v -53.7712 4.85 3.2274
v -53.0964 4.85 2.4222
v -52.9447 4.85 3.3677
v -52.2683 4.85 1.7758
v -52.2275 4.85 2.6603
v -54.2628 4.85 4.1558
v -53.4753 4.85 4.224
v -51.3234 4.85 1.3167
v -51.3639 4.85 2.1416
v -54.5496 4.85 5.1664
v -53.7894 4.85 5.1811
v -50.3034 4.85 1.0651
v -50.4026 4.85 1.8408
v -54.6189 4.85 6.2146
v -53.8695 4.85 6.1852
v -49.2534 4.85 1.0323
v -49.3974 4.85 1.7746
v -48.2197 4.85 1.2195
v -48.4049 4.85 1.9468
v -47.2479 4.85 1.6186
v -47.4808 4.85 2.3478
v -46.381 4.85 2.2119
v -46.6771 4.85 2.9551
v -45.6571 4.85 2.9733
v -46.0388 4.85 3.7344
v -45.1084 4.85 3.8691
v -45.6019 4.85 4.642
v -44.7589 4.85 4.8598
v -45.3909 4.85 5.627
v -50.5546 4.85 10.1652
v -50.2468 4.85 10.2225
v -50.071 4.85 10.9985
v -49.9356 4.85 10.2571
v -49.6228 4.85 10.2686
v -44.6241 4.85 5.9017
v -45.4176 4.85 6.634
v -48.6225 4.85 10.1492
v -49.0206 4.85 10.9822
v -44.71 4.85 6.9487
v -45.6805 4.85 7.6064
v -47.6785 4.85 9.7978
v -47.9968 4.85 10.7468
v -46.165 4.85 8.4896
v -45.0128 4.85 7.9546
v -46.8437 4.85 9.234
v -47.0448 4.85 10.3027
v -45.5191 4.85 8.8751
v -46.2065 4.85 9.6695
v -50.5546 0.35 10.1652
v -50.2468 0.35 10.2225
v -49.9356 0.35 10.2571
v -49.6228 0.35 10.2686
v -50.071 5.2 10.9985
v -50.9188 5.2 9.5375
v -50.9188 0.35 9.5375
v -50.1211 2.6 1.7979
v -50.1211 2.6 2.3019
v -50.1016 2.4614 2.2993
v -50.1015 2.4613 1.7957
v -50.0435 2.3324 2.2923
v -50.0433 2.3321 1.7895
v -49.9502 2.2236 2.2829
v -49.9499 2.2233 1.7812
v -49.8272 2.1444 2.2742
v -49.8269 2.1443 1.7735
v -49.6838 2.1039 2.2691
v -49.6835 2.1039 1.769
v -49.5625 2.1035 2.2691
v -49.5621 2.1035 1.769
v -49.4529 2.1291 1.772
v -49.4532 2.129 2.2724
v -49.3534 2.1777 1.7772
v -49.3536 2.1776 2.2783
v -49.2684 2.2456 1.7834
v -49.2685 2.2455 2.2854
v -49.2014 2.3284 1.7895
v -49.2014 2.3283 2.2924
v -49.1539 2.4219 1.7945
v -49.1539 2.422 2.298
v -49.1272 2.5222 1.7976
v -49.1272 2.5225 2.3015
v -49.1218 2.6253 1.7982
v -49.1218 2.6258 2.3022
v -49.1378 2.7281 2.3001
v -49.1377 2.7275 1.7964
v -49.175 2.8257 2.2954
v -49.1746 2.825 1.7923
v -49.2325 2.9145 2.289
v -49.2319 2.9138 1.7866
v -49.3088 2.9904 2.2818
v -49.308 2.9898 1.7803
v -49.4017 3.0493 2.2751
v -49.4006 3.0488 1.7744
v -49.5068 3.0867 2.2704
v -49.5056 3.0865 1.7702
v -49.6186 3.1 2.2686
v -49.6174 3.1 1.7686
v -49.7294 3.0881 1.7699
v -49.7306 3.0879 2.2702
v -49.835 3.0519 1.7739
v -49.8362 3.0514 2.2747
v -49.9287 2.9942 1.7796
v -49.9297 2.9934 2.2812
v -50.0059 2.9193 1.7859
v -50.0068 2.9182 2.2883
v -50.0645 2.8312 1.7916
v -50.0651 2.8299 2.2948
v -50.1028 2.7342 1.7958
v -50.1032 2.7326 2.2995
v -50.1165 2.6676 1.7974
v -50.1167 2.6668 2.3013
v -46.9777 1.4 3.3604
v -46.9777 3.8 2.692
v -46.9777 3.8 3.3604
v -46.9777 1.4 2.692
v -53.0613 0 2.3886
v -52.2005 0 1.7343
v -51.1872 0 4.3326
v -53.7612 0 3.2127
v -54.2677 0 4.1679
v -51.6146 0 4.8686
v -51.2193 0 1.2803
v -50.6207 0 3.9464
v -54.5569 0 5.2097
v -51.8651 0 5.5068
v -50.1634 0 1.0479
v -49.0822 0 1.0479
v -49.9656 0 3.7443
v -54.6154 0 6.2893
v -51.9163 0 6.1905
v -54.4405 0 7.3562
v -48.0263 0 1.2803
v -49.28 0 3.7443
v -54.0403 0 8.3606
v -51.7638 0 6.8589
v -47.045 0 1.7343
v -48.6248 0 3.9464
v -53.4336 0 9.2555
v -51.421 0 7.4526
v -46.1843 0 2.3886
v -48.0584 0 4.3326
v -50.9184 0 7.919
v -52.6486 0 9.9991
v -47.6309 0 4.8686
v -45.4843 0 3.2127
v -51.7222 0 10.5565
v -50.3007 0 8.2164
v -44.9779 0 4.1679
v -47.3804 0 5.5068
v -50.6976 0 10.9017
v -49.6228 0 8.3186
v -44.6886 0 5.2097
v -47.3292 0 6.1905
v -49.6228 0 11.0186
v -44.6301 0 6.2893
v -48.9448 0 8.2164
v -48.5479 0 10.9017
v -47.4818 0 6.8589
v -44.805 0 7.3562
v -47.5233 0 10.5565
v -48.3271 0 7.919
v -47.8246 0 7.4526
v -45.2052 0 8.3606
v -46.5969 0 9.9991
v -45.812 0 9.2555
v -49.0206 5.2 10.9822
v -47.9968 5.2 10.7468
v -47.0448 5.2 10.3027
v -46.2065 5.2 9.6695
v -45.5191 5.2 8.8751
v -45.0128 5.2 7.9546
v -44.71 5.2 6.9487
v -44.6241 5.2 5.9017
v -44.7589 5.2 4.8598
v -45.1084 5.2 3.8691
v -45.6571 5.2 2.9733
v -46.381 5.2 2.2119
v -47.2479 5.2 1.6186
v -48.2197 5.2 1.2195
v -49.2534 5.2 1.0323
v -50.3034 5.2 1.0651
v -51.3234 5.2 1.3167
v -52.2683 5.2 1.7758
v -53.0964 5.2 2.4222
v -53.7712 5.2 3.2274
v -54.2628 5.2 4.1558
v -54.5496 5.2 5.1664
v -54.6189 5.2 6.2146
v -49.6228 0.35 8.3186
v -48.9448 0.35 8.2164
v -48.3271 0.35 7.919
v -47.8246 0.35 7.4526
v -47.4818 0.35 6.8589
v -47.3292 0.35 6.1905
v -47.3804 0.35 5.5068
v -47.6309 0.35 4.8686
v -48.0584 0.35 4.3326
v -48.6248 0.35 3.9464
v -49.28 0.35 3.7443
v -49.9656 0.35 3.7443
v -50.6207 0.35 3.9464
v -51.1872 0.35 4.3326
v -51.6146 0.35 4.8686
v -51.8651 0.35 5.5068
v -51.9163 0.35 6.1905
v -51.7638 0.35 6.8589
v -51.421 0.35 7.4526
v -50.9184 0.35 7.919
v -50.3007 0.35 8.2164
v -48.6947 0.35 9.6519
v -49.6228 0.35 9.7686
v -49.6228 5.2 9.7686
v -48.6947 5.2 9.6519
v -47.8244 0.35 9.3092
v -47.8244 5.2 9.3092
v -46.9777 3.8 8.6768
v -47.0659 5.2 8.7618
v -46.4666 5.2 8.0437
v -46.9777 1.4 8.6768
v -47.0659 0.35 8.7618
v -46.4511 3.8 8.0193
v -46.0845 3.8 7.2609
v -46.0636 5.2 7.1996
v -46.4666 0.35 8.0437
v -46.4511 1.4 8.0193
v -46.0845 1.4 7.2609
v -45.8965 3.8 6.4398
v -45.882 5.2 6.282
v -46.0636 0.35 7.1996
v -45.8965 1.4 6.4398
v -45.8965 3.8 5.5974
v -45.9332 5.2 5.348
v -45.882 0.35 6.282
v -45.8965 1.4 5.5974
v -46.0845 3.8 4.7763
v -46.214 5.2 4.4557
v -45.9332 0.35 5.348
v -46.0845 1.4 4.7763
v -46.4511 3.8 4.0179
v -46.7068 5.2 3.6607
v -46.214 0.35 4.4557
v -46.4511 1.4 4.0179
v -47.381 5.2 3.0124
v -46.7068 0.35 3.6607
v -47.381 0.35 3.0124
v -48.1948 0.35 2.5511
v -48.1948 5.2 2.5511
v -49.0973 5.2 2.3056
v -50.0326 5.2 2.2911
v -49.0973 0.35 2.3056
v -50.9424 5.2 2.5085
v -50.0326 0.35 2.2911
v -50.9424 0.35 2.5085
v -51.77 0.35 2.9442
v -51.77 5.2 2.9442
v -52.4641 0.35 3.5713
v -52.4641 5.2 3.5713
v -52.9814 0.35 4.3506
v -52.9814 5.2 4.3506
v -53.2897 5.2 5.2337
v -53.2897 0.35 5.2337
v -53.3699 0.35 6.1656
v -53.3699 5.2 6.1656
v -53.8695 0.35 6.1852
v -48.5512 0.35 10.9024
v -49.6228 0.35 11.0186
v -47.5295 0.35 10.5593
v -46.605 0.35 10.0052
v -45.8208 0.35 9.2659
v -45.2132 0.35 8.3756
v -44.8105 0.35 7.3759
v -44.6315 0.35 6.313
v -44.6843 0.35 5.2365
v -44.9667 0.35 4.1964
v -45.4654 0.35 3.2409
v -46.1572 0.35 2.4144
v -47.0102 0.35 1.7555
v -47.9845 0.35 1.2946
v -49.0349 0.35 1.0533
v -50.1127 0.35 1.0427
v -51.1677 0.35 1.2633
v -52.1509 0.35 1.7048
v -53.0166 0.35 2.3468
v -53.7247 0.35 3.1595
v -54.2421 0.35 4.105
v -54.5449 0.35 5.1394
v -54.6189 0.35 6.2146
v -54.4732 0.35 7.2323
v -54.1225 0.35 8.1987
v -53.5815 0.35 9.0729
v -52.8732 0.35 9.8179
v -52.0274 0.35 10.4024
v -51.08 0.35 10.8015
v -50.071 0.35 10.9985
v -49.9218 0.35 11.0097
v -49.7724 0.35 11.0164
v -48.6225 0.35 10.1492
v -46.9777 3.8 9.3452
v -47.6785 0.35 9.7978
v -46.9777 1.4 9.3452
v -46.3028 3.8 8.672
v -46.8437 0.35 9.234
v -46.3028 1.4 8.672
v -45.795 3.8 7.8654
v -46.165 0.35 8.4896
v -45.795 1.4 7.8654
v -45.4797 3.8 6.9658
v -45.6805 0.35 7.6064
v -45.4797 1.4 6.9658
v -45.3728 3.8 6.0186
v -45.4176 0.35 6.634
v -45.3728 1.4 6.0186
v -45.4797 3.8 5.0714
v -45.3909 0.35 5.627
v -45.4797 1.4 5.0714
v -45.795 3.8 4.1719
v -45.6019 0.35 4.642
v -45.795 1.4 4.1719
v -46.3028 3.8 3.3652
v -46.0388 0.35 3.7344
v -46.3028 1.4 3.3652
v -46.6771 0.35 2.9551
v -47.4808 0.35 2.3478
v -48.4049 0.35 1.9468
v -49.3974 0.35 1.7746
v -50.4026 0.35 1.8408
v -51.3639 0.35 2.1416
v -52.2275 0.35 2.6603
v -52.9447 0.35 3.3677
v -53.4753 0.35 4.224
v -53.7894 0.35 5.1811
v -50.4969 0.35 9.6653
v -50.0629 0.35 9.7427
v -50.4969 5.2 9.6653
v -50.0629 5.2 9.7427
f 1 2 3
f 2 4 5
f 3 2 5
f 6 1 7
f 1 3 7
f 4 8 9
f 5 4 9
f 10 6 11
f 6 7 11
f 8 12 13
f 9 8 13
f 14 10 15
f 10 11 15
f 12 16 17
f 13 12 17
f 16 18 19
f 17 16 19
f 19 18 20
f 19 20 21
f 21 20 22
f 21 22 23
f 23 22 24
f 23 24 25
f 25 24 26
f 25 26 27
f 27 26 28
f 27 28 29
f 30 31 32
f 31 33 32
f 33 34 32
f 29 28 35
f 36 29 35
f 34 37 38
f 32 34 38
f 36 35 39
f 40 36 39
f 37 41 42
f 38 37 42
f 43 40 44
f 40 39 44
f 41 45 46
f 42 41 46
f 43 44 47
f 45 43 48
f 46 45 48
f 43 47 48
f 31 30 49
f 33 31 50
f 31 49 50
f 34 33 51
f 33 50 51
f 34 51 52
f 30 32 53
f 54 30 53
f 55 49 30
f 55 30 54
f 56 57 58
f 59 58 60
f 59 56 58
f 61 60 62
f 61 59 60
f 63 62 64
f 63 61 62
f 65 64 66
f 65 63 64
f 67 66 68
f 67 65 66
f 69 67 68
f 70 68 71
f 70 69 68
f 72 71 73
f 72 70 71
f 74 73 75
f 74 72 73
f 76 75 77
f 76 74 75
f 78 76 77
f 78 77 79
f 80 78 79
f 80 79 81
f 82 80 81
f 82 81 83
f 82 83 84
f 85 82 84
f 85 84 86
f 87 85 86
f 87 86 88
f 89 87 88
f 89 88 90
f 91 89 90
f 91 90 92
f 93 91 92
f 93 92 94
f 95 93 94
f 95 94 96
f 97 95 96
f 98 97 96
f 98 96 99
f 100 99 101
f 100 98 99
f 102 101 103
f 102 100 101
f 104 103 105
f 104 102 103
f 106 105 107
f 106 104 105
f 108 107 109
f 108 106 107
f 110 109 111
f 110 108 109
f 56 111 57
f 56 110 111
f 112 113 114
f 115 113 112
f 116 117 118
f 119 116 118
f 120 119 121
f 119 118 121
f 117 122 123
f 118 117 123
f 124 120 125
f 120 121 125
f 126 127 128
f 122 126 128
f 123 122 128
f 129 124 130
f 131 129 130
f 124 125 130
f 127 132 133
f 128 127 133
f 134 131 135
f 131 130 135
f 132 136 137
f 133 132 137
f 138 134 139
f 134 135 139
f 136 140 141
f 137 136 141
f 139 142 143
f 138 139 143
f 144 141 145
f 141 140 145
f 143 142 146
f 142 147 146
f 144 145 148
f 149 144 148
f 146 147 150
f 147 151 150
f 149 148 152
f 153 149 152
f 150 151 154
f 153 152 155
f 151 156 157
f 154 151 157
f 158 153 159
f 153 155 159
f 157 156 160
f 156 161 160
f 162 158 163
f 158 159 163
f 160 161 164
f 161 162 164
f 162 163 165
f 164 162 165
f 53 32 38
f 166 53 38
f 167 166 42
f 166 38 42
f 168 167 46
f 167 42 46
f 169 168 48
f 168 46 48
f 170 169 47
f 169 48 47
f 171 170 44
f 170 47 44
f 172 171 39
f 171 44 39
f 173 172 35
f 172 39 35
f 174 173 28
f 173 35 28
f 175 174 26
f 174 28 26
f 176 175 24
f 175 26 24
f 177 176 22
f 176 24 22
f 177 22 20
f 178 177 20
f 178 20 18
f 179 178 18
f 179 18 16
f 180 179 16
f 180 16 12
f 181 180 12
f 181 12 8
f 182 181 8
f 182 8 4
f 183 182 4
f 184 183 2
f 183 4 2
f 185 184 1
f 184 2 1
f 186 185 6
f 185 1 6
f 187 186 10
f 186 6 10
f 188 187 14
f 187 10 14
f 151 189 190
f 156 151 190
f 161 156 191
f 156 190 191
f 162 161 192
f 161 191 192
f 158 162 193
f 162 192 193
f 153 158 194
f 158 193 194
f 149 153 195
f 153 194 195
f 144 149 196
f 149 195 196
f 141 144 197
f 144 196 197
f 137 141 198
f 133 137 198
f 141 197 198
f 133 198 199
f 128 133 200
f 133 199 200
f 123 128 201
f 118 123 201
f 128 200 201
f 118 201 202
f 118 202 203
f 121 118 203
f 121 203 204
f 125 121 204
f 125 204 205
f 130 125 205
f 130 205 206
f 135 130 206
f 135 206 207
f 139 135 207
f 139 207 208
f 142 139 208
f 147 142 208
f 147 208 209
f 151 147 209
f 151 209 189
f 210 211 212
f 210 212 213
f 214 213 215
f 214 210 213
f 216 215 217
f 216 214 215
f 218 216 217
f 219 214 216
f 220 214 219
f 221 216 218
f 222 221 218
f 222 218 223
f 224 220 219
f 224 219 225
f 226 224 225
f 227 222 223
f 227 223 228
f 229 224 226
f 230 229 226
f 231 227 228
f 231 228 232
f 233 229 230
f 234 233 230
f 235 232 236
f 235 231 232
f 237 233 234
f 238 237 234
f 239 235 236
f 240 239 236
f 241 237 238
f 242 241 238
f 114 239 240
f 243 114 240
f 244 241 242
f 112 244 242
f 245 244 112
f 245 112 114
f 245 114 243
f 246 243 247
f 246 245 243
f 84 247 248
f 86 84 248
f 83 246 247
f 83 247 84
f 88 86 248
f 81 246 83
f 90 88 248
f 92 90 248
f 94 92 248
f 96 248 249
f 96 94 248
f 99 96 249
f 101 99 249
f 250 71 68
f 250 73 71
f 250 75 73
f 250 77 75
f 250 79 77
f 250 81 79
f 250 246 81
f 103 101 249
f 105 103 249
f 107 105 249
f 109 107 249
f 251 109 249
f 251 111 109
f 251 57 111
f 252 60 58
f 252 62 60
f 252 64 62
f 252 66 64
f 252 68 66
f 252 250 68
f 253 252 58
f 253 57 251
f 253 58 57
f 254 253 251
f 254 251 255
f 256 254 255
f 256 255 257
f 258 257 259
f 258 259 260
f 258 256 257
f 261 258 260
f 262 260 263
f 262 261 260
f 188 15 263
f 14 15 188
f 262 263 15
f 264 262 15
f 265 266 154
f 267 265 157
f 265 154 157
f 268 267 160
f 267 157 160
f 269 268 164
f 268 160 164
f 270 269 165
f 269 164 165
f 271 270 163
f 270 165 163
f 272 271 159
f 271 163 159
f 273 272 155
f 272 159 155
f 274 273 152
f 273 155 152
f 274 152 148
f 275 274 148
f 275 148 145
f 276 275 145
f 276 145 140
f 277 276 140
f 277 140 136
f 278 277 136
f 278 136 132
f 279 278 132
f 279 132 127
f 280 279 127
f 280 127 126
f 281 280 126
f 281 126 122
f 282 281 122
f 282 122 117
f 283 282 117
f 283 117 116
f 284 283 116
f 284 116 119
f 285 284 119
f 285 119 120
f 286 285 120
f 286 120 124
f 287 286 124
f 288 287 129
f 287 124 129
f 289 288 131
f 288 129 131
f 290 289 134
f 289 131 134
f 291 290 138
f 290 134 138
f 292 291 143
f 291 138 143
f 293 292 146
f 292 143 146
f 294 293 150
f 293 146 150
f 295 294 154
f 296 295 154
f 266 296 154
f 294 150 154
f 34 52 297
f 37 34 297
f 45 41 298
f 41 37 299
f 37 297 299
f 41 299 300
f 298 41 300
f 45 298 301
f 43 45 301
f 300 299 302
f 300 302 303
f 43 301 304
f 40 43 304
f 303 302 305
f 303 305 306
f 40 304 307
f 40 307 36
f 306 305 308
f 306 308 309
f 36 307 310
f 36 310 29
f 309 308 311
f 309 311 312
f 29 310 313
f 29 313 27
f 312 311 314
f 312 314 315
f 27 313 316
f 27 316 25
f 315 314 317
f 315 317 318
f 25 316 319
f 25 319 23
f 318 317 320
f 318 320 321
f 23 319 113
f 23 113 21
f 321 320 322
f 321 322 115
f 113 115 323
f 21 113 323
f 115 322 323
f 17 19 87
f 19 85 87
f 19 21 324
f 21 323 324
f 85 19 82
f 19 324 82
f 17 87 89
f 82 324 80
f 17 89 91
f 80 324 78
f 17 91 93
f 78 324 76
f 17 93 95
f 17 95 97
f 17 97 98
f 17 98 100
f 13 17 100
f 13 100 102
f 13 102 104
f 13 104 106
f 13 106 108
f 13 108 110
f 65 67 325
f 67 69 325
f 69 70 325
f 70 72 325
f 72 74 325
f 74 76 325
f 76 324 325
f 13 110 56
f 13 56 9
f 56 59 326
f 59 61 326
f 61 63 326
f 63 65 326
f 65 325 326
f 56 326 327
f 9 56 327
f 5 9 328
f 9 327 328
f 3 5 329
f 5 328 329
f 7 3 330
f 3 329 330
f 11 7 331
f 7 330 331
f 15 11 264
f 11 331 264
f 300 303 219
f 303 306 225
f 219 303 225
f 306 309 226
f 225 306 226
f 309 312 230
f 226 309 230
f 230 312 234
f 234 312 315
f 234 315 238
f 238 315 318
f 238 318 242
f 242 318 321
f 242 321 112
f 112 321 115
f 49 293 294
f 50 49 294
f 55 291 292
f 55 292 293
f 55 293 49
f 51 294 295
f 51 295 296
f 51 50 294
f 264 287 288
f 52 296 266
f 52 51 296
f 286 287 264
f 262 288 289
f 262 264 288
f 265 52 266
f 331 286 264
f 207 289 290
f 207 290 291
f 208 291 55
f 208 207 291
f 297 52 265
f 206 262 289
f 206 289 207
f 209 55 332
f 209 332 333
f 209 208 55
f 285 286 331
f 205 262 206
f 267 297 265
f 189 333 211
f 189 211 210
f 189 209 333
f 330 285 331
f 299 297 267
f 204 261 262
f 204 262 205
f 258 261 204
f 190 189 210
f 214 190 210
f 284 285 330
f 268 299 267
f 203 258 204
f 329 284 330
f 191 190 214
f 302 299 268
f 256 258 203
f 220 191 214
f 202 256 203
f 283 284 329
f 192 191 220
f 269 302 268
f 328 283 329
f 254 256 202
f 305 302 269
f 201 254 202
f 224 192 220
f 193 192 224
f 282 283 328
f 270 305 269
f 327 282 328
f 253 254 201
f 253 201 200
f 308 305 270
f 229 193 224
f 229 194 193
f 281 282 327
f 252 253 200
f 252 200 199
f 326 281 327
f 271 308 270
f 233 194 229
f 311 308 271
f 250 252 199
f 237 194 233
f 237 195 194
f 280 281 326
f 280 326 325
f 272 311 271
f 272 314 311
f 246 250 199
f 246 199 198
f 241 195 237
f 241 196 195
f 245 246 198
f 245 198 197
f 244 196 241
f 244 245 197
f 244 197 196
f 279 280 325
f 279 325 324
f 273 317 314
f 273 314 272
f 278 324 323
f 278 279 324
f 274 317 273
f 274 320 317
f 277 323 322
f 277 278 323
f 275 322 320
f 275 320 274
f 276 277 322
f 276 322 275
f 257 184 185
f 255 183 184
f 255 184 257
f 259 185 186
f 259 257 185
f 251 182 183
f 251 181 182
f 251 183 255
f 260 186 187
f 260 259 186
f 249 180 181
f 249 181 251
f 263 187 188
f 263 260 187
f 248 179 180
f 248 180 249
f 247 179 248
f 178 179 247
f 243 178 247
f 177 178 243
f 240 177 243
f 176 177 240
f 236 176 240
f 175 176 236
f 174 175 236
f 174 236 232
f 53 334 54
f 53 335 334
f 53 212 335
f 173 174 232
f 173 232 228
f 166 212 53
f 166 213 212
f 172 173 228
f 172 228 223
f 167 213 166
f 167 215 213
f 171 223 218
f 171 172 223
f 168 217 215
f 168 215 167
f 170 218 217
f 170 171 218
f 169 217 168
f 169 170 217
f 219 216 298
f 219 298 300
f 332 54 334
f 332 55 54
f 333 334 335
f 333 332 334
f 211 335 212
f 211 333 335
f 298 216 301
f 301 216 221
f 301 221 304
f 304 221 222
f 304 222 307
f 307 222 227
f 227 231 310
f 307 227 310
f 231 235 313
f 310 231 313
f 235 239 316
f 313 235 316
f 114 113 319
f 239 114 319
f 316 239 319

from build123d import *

# Parameters (mm, degrees)
SKETCH1_R           = 5
BOSS_EXTRUDE1_DEPTH = 0.35
SKETCH2_R           = 4.25
SKETCH2_R_2         = 3.75
BOSS_EXTRUDE6_DEPTH = 4.5
SKETCH5_R           = 5
SKETCH5_R_2         = 3.75
BOSS_EXTRUDE7_DEPTH = 0.35
SKETCH9_R           = 2.3
CUT_EXTRUDE5_DEPTH  = 11.4
CUT_EXTRUDE6_DEPTH  = 11.4
CUT_EXTRUDE8_START  = -4.85
CUT_EXTRUDE8_DEPTH  = 4.85
SKETCH12_R          = 0.5
CUT_EXTRUDE9_DEPTH  = 4.85


with BuildPart() as part:
    # Sketch1 → Boss-Extrude1 (new body)
    with BuildSketch(Plane(origin=(0, 0, 0), x_dir=(1, 0, 0), z_dir=(0, 1, 0))):
        with Locations(Location((-49.622774045, -6.018603783, 0), (0, 0, 270))):
            Circle(SKETCH1_R)
    extrude(amount=BOSS_EXTRUDE1_DEPTH)

    # Sketch2 → Boss-Extrude6 (add)
    with BuildSketch(Plane(origin=(0, 0.35, 0), x_dir=(1, 0, 0), z_dir=(0, 1, 0))):
        with Locations(Location((-49.622774045, -6.018603783, 0), (0, 0, 270))):
            Circle(SKETCH2_R)
        with Locations(Location((-49.622774045, -6.018603783, 0), (0, 0, 270))):
            Circle(SKETCH2_R_2, mode=Mode.SUBTRACT)
    extrude(amount=BOSS_EXTRUDE6_DEPTH)

    # Sketch5 → Boss-Extrude7 (add)
    with BuildSketch(Plane(origin=(0, 4.85, 0), x_dir=(1, 0, 0), z_dir=(0, 1, 0))):
        with Locations(Location((-49.622774045, -6.018603783, 0), (0, 0, 270))):
            Circle(SKETCH5_R)
        with Locations(Location((-49.622774045, -6.018603783, 0), (0, 0, 270))):
            Circle(SKETCH5_R_2, mode=Mode.SUBTRACT)
    extrude(amount=BOSS_EXTRUDE7_DEPTH)

    # Sketch9 → Cut-Extrude5 (cut)
    with BuildSketch(Plane(origin=(0, 0.35, 0), x_dir=(1, 0, 0), z_dir=(0, 1, 0))):
        with Locations(Location((-49.622774045, -6.018603783, 0), (0, 0, 270))):
            Circle(SKETCH9_R)
    extrude(amount=-CUT_EXTRUDE5_DEPTH, mode=Mode.SUBTRACT)

    # Sketch10 → Cut-Extrude6 (cut)
    with BuildSketch(Plane.XY):
        Polygon((-43.20579759, 3.8), (-43.20579759, 1.4), (-46.977708805, 1.4), (-46.977708805, 2.6), (-46.977708805, 3.8), align=None)
    extrude(amount=CUT_EXTRUDE6_DEPTH, mode=Mode.SUBTRACT)

    # Sketch11 → Cut-Extrude8 (cut)
    with BuildSketch(Plane(origin=(0, 5.2, 0), x_dir=(1, 0, 0), z_dir=(0, 1, 0)).offset(CUT_EXTRUDE8_START)):
        with BuildLine():
            Line((-53.369890601, -6.165632753), (-54.618929453, -6.21464241))
            ThreePointArc((-54.618929453, -6.21464241), (-53.246537308, -9.463649474), (-50.071032009, -10.998469725))
            Line((-50.071032009, -10.998469725), (-50.91884618, -9.53750944))
            ThreePointArc((-50.91884618, -9.53750944), (-52.656060405, -8.223524158), (-53.369890601, -6.165632753))
        make_face()
    extrude(amount=CUT_EXTRUDE8_DEPTH, mode=Mode.SUBTRACT)

    # Sketch12 → Cut-Extrude9 (cut)
    with BuildSketch(Plane.XY):
        with Locations(Location((-49.621140094, 2.6, 0), (0, 0, 180))):
            Circle(SKETCH12_R)
    extrude(amount=CUT_EXTRUDE9_DEPTH, mode=Mode.SUBTRACT)


solid = part.part
